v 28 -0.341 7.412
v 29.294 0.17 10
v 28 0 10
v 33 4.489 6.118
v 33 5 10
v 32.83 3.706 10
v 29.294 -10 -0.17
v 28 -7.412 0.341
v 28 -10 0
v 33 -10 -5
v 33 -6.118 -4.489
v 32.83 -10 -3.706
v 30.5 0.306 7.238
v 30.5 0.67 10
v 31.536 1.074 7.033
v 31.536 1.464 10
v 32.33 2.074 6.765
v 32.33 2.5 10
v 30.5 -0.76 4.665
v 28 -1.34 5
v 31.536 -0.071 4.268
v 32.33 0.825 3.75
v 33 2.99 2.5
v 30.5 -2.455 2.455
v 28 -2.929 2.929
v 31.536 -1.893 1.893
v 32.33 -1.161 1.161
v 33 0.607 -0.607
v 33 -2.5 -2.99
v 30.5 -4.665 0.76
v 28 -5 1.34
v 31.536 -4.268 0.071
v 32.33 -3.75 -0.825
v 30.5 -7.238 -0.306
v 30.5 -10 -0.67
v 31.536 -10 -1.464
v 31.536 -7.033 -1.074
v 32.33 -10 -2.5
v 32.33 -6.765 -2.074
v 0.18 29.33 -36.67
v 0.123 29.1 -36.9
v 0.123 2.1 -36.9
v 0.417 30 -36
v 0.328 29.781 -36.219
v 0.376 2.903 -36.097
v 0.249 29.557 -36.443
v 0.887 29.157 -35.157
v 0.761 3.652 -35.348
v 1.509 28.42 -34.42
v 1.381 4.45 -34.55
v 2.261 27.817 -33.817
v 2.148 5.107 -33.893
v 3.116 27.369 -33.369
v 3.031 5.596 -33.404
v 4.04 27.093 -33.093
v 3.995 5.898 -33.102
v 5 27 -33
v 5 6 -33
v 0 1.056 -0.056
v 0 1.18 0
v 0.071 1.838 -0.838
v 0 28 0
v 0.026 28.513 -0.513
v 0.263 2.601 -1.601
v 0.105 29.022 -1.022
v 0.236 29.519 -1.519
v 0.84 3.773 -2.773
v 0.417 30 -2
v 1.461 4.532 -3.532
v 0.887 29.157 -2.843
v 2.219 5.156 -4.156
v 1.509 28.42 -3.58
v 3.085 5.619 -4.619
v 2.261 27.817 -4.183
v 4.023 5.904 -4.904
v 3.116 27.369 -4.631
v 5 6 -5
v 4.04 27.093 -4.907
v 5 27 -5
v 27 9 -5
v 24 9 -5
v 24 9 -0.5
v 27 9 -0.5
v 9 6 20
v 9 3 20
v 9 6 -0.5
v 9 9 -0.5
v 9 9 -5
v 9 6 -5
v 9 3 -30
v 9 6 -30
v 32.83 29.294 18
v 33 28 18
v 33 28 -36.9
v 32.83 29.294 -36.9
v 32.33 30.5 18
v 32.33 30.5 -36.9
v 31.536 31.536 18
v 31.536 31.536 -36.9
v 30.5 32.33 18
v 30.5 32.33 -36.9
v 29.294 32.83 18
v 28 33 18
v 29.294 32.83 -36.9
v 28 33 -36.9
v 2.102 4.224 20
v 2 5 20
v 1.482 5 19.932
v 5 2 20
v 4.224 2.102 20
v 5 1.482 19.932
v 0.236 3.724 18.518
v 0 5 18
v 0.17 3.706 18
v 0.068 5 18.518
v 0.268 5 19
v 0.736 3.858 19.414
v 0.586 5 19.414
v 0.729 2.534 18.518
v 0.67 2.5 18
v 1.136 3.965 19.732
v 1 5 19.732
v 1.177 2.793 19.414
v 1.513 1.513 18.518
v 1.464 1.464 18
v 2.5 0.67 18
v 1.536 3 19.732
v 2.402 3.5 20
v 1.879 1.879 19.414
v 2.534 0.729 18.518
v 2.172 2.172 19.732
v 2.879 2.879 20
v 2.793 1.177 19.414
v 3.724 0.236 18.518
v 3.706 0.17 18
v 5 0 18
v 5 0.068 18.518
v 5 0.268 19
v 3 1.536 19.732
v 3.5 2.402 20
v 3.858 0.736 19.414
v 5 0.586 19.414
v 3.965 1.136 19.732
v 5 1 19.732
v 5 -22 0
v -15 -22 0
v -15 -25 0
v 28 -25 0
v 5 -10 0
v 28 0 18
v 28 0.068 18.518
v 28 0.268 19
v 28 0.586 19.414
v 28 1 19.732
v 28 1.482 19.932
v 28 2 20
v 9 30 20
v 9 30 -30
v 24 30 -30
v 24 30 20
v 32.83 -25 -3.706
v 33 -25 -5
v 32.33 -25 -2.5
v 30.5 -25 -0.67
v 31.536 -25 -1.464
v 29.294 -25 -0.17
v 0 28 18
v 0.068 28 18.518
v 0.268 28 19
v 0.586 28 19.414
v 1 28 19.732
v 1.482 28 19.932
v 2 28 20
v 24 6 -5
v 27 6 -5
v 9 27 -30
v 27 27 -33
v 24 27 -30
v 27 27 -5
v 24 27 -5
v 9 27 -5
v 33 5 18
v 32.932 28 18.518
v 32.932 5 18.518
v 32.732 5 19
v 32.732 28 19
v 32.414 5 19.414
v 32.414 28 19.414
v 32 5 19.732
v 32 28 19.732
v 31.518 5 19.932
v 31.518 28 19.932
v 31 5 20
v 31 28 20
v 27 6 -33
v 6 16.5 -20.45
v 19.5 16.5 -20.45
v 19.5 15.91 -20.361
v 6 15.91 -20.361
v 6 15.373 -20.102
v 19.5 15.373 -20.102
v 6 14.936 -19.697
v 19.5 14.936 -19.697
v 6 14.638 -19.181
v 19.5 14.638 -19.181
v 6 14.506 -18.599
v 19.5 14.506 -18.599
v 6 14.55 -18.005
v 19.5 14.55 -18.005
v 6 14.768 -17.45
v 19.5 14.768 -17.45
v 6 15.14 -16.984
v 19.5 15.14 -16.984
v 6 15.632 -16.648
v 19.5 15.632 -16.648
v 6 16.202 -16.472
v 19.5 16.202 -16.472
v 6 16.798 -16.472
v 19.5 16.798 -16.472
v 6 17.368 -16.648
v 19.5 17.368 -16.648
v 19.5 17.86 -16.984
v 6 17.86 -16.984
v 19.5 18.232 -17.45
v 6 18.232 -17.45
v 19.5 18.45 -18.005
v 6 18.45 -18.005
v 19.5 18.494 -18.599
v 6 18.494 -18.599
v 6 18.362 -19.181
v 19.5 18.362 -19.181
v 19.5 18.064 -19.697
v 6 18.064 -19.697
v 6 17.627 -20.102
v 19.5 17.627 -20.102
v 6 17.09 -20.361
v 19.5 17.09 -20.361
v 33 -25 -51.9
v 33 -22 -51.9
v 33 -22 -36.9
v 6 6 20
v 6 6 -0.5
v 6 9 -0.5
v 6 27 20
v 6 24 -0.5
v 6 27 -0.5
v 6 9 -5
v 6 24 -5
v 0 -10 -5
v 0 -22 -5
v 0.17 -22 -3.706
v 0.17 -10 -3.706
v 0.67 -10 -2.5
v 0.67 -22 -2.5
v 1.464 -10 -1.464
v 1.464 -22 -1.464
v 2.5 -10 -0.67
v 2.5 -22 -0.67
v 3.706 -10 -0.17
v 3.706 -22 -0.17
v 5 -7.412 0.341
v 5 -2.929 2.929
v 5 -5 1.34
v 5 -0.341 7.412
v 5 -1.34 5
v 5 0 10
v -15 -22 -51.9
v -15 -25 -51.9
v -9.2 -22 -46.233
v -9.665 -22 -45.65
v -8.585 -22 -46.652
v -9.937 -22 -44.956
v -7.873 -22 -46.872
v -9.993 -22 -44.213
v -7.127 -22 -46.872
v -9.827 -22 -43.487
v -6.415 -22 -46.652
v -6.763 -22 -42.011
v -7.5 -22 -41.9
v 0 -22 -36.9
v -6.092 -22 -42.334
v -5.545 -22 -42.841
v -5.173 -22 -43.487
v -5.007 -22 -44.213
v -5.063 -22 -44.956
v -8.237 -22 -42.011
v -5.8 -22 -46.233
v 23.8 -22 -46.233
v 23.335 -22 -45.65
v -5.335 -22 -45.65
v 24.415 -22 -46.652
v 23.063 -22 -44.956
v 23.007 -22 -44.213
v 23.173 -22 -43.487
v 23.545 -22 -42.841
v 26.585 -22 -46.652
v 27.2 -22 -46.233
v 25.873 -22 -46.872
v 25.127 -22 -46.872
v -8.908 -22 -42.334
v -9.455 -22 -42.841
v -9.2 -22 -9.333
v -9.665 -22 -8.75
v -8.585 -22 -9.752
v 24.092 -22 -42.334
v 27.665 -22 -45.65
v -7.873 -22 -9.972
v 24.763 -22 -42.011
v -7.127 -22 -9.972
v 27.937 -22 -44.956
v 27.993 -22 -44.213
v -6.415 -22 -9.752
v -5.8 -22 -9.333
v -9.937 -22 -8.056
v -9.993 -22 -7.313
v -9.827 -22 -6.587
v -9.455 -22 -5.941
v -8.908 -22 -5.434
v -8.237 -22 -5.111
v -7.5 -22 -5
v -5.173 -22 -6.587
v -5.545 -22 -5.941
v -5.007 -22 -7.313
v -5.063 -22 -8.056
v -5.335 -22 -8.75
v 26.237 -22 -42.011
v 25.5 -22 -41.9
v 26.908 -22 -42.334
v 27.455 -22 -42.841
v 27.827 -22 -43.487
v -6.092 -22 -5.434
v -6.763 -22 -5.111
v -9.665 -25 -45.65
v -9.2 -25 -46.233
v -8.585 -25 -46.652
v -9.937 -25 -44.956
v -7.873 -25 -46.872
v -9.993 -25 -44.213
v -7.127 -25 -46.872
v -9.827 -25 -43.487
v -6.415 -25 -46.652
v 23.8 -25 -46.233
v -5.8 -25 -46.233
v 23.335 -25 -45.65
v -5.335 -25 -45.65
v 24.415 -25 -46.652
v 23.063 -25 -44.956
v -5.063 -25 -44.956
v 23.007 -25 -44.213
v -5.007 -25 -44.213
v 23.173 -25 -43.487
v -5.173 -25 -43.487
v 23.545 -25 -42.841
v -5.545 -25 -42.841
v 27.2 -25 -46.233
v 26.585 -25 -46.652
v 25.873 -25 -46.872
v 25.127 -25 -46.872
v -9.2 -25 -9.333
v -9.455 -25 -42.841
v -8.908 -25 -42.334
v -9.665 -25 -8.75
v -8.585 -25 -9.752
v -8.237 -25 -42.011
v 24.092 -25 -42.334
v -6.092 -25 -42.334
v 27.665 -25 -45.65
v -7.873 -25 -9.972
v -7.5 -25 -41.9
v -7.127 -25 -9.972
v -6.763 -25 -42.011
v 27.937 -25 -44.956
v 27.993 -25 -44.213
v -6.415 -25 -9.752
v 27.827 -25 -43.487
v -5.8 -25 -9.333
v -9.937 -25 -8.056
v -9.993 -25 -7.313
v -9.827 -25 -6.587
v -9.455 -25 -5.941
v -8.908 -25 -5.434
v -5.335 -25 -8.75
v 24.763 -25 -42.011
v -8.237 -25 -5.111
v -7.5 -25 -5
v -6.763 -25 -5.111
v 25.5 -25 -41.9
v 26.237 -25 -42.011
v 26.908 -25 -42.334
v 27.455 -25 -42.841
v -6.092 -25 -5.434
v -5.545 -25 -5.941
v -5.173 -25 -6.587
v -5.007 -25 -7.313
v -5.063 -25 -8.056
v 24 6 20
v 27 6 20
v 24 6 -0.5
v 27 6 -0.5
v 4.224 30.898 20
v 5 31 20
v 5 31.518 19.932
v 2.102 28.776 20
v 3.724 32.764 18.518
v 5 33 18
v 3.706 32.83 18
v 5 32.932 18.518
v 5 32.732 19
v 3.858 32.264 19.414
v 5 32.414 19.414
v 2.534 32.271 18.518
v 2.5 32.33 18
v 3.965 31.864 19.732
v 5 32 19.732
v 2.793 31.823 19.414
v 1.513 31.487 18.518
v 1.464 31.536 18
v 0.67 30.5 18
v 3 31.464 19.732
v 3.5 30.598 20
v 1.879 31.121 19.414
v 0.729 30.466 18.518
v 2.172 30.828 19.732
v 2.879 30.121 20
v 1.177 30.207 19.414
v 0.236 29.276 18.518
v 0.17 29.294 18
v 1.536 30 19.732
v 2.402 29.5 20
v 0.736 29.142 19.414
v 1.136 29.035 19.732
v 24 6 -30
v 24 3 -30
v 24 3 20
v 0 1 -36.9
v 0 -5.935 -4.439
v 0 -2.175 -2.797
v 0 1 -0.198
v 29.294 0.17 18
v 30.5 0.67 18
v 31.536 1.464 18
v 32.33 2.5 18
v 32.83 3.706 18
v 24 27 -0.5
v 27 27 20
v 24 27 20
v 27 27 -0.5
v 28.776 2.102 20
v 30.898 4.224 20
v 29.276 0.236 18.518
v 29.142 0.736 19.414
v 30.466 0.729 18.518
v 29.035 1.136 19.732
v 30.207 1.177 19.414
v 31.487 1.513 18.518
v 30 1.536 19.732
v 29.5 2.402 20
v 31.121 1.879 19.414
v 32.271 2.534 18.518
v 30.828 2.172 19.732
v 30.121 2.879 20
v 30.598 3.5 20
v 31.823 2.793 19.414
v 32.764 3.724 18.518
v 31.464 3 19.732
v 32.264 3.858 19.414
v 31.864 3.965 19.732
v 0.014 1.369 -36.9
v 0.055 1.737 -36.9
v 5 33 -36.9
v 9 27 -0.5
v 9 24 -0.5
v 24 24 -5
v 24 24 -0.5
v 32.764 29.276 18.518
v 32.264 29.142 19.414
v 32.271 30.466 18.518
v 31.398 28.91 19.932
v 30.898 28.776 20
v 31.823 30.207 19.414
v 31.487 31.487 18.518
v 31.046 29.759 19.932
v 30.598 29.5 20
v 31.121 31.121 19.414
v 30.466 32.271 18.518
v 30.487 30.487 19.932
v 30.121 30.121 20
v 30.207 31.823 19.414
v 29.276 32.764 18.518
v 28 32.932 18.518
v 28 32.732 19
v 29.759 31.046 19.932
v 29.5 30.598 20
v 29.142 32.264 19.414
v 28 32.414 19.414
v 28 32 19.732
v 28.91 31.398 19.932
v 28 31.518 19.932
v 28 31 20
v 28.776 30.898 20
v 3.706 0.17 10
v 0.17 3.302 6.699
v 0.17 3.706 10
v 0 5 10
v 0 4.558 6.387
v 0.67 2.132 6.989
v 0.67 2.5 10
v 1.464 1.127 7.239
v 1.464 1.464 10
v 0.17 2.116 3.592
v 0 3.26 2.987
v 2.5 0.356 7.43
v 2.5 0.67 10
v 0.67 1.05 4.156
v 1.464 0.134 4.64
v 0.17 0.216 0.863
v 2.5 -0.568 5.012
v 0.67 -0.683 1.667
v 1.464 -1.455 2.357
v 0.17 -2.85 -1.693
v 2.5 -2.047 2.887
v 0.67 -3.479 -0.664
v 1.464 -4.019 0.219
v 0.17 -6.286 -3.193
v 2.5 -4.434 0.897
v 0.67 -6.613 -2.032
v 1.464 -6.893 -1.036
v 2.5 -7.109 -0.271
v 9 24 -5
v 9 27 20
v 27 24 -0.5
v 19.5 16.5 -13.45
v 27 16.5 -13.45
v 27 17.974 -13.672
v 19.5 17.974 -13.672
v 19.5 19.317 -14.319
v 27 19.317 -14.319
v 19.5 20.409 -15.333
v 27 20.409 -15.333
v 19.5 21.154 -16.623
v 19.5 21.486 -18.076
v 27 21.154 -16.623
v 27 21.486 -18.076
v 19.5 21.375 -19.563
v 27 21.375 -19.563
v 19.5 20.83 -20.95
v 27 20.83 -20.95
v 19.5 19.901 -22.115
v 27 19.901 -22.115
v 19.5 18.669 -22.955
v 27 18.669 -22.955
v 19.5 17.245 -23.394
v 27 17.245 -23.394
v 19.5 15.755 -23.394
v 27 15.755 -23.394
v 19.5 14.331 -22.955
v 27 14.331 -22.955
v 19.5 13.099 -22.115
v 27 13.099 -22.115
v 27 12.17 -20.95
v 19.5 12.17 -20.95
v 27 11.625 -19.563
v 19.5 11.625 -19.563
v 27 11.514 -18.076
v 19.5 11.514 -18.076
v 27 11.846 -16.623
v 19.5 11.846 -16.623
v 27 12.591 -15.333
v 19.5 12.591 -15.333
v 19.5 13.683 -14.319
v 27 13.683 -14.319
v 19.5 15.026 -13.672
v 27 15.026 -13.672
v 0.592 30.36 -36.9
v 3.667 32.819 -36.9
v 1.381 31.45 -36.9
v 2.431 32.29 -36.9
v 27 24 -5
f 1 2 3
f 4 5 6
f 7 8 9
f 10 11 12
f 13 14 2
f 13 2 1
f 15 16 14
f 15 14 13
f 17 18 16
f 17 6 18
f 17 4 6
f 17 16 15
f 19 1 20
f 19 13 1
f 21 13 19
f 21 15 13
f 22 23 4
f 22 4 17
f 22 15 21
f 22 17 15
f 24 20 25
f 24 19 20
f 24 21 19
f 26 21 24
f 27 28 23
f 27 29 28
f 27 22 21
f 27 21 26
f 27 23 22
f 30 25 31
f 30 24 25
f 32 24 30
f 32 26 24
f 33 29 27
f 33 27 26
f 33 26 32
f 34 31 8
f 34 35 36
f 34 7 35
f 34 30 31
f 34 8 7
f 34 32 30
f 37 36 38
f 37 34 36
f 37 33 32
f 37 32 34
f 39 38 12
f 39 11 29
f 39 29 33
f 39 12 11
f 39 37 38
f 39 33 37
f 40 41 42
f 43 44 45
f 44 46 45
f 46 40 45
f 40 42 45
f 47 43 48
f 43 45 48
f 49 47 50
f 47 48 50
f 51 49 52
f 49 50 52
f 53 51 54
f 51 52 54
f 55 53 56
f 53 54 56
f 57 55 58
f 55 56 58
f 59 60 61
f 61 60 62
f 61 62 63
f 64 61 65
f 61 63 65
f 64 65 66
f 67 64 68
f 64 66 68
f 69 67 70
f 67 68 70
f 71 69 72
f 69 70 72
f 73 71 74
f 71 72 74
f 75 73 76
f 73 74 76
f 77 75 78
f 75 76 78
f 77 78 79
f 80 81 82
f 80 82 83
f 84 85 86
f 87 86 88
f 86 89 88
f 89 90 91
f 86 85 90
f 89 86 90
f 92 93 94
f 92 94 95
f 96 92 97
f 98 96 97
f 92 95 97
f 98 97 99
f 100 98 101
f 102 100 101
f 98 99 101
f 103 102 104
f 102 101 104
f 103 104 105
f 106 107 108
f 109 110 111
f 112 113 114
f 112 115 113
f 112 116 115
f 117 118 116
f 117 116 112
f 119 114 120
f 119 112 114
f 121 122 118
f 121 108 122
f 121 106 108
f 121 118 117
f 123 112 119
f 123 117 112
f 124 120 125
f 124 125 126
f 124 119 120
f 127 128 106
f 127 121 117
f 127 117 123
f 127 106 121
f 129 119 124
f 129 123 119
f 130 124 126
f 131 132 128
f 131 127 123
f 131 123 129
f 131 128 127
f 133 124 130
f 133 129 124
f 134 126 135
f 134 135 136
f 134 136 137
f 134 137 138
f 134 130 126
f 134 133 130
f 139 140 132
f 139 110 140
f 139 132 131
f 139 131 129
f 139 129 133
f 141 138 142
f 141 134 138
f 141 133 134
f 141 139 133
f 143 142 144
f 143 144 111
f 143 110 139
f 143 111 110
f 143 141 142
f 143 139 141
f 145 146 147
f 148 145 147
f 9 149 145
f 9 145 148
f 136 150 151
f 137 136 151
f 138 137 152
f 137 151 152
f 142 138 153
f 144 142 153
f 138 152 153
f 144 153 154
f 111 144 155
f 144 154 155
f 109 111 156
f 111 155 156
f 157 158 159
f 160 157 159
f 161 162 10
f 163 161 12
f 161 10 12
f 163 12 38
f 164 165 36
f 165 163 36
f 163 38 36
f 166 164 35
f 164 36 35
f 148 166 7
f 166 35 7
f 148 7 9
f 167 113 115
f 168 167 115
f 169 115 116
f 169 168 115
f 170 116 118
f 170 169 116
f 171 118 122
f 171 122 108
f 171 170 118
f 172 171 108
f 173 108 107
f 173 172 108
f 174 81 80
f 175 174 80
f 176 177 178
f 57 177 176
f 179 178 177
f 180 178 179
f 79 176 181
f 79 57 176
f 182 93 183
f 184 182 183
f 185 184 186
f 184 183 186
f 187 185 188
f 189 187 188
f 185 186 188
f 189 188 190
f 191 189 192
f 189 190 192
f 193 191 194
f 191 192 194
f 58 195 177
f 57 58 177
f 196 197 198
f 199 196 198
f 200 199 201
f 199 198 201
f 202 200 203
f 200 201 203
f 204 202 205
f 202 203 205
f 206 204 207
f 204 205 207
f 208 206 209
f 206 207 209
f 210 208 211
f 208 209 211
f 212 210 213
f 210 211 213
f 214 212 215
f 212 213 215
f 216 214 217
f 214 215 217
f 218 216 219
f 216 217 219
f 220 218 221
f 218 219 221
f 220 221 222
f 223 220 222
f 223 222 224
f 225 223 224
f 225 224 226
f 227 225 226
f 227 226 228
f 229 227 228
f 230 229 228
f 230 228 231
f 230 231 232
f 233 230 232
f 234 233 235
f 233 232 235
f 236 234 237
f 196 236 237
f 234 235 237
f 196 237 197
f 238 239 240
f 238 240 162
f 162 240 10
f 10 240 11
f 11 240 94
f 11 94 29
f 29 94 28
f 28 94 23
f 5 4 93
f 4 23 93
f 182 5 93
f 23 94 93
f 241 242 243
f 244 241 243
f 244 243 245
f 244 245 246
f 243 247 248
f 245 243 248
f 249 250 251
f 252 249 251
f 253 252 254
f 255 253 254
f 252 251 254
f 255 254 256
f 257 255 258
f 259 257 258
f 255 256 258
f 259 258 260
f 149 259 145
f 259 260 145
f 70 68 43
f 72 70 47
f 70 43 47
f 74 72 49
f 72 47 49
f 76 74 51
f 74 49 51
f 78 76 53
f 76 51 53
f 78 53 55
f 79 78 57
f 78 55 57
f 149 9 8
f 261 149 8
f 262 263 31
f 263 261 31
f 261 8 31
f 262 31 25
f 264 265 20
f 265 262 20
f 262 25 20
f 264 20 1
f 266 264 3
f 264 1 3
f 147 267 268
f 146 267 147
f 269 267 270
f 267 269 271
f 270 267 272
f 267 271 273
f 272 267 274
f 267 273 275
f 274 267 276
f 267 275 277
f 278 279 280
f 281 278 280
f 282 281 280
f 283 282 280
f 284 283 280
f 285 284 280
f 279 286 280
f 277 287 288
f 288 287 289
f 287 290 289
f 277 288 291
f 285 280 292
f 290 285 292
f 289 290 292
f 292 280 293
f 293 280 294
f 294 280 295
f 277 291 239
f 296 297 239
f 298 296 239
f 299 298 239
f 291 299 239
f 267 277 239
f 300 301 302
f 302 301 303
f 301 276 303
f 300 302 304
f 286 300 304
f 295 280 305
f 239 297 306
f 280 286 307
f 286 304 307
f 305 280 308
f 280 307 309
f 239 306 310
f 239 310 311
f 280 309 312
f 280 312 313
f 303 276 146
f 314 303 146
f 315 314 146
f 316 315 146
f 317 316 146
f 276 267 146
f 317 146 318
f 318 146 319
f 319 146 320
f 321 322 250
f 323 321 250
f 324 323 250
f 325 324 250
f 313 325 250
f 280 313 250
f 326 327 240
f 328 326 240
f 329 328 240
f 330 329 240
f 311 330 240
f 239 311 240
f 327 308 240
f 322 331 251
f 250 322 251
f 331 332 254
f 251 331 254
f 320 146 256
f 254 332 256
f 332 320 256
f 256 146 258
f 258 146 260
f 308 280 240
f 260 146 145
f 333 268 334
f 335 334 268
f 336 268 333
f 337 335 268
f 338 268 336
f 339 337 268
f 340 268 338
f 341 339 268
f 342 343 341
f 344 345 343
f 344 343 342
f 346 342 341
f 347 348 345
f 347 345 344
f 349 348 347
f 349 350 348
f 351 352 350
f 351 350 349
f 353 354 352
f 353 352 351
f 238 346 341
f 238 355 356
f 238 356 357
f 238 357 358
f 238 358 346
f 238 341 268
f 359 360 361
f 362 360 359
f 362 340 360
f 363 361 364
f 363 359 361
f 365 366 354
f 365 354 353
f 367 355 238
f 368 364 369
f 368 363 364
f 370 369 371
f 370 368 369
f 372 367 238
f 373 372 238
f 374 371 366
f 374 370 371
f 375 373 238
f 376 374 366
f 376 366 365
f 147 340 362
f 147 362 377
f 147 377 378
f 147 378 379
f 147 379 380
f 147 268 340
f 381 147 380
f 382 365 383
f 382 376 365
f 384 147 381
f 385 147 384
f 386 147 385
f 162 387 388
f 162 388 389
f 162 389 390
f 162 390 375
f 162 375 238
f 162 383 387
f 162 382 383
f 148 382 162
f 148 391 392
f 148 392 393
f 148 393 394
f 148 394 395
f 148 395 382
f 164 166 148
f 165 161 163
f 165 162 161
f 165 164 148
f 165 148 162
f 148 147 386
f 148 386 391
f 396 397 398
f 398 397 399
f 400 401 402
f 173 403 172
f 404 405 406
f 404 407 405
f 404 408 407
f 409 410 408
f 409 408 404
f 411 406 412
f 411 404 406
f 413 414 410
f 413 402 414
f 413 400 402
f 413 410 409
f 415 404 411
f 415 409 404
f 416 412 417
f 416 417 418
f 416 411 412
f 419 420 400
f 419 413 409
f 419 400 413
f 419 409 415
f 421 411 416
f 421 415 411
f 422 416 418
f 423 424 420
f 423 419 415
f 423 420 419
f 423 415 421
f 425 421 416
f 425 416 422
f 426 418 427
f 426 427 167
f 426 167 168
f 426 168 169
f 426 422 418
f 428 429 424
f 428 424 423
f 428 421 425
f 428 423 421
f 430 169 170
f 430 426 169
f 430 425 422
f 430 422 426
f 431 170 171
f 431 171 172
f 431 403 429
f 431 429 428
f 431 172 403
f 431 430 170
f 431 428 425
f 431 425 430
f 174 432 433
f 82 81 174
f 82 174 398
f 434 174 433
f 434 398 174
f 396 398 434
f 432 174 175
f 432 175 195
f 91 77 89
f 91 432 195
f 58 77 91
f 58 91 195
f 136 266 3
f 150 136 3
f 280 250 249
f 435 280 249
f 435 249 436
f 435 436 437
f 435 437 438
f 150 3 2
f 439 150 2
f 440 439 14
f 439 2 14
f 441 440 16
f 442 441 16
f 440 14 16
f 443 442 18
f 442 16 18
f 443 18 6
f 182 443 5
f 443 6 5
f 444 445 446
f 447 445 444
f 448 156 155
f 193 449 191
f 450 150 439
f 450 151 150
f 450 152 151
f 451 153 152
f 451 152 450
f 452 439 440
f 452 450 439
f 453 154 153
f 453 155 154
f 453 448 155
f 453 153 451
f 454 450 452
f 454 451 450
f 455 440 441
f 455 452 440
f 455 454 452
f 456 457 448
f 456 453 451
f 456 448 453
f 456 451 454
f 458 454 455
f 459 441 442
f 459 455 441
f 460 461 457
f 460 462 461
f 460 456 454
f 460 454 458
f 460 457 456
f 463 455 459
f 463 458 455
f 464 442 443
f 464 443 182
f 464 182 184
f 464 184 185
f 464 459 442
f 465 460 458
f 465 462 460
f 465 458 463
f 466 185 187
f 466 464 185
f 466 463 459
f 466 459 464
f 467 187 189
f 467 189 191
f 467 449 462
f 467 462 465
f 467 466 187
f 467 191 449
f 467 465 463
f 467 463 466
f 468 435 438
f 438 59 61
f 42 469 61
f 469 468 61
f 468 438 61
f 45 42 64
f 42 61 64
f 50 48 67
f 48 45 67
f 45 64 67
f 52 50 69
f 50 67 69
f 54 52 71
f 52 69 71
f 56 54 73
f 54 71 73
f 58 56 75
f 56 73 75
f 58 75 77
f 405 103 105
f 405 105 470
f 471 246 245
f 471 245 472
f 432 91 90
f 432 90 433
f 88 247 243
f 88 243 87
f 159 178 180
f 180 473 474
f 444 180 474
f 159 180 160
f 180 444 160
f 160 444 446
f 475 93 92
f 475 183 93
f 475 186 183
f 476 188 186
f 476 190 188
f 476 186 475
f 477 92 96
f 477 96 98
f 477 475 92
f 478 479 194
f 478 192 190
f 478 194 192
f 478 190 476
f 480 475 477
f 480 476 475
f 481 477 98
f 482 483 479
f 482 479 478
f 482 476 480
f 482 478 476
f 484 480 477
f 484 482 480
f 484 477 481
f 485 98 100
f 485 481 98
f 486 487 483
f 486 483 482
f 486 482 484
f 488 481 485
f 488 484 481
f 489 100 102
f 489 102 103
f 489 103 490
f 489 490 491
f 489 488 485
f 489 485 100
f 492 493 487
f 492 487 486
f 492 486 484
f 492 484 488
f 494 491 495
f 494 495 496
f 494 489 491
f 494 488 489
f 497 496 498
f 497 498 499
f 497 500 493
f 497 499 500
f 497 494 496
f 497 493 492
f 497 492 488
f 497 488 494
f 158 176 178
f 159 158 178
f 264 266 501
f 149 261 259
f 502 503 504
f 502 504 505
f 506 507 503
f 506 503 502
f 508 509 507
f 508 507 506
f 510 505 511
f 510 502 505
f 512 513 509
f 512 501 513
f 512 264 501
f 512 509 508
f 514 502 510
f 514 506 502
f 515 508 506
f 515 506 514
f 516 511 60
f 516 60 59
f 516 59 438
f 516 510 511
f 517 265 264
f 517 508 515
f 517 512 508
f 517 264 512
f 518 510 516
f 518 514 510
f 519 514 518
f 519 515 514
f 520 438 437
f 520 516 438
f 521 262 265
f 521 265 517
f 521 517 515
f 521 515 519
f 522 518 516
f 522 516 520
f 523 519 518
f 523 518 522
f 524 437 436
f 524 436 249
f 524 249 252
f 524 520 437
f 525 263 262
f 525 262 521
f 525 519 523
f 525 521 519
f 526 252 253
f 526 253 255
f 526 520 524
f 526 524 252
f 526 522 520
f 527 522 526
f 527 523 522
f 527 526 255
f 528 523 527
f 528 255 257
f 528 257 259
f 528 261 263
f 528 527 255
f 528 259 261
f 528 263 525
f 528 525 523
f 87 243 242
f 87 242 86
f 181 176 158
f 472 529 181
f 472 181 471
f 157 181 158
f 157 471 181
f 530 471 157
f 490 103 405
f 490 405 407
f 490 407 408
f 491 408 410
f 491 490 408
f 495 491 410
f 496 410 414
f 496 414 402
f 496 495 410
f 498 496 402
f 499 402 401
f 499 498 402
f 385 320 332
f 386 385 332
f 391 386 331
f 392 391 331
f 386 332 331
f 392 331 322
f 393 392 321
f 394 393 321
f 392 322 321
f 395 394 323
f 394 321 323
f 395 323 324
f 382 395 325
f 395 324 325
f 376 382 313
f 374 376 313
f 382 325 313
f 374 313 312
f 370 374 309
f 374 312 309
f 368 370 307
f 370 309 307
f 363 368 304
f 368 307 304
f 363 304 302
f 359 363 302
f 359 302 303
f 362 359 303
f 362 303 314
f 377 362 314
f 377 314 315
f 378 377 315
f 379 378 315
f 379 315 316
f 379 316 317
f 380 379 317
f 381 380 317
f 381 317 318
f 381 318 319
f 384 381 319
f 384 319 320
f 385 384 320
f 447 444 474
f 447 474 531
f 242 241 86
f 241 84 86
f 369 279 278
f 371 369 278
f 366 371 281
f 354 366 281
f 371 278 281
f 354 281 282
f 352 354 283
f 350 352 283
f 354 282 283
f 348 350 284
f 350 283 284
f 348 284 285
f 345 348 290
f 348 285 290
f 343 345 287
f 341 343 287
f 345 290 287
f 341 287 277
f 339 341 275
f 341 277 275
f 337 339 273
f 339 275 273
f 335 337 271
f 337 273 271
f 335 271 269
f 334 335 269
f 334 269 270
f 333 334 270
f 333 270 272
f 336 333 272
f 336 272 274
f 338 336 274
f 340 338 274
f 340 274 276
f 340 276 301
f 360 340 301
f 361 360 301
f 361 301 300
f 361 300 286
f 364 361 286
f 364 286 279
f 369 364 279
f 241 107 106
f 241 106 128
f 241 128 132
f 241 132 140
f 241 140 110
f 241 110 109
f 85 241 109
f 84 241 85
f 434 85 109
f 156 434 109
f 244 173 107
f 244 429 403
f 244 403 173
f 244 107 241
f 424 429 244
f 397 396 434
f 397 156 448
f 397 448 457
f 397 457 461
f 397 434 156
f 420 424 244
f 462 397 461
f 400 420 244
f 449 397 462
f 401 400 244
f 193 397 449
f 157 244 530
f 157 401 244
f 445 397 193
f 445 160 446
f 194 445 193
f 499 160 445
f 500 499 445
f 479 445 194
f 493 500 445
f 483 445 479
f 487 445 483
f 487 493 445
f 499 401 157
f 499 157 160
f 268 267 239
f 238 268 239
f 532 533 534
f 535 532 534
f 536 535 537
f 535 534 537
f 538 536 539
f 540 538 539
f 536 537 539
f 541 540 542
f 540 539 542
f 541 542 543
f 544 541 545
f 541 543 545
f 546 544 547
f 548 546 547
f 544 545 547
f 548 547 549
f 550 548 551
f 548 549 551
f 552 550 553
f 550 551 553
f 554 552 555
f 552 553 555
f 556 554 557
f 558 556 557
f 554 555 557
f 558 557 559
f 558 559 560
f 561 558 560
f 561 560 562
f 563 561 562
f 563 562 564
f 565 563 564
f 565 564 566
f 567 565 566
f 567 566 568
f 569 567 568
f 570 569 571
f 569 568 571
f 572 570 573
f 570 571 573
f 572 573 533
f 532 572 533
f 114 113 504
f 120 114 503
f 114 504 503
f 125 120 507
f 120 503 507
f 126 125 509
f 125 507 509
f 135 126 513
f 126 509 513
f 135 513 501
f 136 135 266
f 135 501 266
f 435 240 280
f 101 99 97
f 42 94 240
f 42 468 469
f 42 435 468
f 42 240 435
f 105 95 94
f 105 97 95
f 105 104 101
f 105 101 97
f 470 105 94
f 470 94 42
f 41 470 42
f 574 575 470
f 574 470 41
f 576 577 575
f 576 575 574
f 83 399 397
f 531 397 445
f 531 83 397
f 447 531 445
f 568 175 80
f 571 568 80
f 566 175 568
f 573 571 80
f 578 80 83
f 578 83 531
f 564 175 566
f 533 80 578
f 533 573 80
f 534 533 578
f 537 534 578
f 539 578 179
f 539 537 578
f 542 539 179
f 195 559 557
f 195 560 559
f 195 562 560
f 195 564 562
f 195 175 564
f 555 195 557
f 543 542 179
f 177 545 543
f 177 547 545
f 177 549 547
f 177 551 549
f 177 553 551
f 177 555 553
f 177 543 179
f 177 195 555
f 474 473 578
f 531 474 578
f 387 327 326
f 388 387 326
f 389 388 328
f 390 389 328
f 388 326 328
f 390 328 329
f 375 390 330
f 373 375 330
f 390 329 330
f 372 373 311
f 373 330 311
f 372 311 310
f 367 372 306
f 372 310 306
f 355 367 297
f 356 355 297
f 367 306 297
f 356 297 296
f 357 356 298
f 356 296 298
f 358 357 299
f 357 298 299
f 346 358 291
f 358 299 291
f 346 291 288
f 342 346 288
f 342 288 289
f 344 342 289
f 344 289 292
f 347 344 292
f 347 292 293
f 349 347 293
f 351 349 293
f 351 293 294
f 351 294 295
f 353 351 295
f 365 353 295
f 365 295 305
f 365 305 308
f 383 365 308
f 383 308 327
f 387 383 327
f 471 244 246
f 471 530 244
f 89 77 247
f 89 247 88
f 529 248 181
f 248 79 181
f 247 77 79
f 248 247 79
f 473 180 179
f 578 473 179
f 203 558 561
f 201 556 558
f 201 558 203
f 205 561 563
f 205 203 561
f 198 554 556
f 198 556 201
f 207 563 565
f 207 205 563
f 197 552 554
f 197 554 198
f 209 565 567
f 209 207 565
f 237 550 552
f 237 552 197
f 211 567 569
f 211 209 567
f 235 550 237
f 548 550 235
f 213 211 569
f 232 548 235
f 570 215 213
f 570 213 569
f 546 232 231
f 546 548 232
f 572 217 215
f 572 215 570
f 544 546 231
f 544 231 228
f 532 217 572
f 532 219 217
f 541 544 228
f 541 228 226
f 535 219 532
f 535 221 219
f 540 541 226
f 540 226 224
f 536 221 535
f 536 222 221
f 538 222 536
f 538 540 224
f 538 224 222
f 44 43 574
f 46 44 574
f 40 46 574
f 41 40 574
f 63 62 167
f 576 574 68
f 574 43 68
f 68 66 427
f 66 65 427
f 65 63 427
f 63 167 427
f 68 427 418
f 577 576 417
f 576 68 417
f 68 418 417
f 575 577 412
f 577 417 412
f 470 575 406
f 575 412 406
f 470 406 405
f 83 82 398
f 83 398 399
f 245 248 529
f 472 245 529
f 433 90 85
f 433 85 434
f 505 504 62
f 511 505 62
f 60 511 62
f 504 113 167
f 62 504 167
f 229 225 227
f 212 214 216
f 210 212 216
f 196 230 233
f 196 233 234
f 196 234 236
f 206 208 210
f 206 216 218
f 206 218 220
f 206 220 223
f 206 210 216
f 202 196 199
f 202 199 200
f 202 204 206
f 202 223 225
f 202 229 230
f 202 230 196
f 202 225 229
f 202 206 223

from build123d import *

# Parameters (mm, degrees)
SKETCH1_W           = 33
SKETCH1_H           = 33
BOSS_EXTRUDE1_DEPTH = 20
SHELL1_T            = -6
SKETCH2_W           = 33
SKETCH2_H           = 55
BOSS_EXTRUDE2_DEPTH = 36.9
SKETCH5_W           = 48
SKETCH5_H           = 51.9
BOSS_EXTRUDE3_DEPTH = 3
SKETCH6_R           = 2.5
CUT_EXTRUDE1_DEPTH  = 83.508242013
SKETCH7_W           = 15
SKETCH7_H           = 50
CUT_EXTRUDE2_DEPTH  = 3
SKETCH9_W           = 21
SKETCH9_H           = 21
CUT_EXTRUDE3_DEPTH  = 39
SKETCH10_R          = 5
BOSS_EXTRUDE4_DEPTH = 7.5
SKETCH12_W          = 28
SKETCH12_H          = 21
CUT_EXTRUDE4_DEPTH  = 19
SKETCH13_R          = 2
BOSS_EXTRUDE5_DEPTH = 13.5
FILLET1_R           = 10
BOSS_EXTRUDE6_START = -25
SKETCH14_W          = 3
SKETCH14_H          = 3
BOSS_EXTRUDE6_DEPTH = 4.5
FILLET2_R           = 2
FILLET3_R           = 5
FILLET4_R           = 5


with BuildPart() as part:
    # Sketch1 → Boss-Extrude1 (new body)
    with BuildSketch(Plane.XY):
        with Locations((16.5, 16.5)):
            Rectangle(SKETCH1_W, SKETCH1_H)
    extrude(amount=BOSS_EXTRUDE1_DEPTH)

    # Shell1
    shell1_openings = [part.faces().sort_by_distance(p)[0] for p in [
        (16.5, 16.5, 20),
    ]]
    offset(amount=SHELL1_T, openings=shell1_openings, kind=Kind.INTERSECTION)

    # Sketch2 → Boss-Extrude2 (add)
    with BuildSketch(Plane(origin=(0, 0, 0), x_dir=(-1, 0, 0), z_dir=(0, 0, -1))):
        with Locations((-16.5, 5.5)):
            Rectangle(SKETCH2_W, SKETCH2_H)
    extrude(amount=BOSS_EXTRUDE2_DEPTH)

    # Sketch5 → Boss-Extrude3 (add)
    with BuildSketch(Plane.XZ.offset(22)):
        with Locations((9, -25.95)):
            Rectangle(SKETCH5_W, SKETCH5_H)
    extrude(amount=BOSS_EXTRUDE3_DEPTH)

    # Sketch6 → Cut-Extrude1 (cut, through all)
    with BuildSketch(Plane(origin=(0, -22, 0), x_dir=(1, 0, 0), z_dir=(0, 1, 0))):
        with Locations(Location((-7.5, 7.5, 0), (0, 0, 270))):
            Circle(SKETCH6_R)
        with Locations(Location((-7.5, 44.4, 0), (0, 0, 270))):
            Circle(SKETCH6_R)
        with Locations(Location((25.5, 44.4, 0), (0, 0, 270))):
            Circle(SKETCH6_R)
    extrude(amount=-CUT_EXTRUDE1_DEPTH, mode=Mode.SUBTRACT)

    # Sketch7 → Cut-Extrude2 (cut)
    with BuildSketch(Plane.XZ.offset(-27)):
        with Locations((16.5, -5)):
            Rectangle(SKETCH7_W, SKETCH7_H)
    cut_extrude2 = extrude(amount=-CUT_EXTRUDE2_DEPTH, mode=Mode.SUBTRACT)

    # Mirror2: Cut-Extrude2 across plane
    add(cut_extrude2.mirror(Plane(origin=(0, 16.5, 0), x_dir=(0, 0, 1), z_dir=(0, -1, 0))), mode=Mode.SUBTRACT)

    # Sketch9 → Cut-Extrude3 (cut)
    with BuildSketch(Plane.XY.offset(6)):
        with Locations((16.5, 16.5)):
            Rectangle(SKETCH9_W, SKETCH9_H)
    extrude(amount=-CUT_EXTRUDE3_DEPTH, mode=Mode.SUBTRACT)

    # Sketch10 → Boss-Extrude4 (add)
    with BuildSketch(Plane.ZY.offset(-27)):
        with Locations((-18.45, 16.5)):
            Circle(SKETCH10_R)
    extrude(amount=BOSS_EXTRUDE4_DEPTH)

    # Sketch12 → Cut-Extrude4 (cut)
    with BuildSketch(Plane(origin=(6, 0, 0), x_dir=(0, 0, -1), z_dir=(1, 0, 0))):
        with Locations((19, 16.5)):
            Rectangle(SKETCH12_W, SKETCH12_H)
    extrude(amount=-CUT_EXTRUDE4_DEPTH, mode=Mode.SUBTRACT)

    # Sketch13 → Boss-Extrude5 (add)
    with BuildSketch(Plane.ZY.offset(-19.5)):
        with Locations(Location((-18.45, 16.5, 0), (0, 0, 180))):
            Circle(SKETCH13_R)
    extrude(amount=BOSS_EXTRUDE5_DEPTH)

    # Fillet1
    fillet1_edges = [part.edges().sort_by_distance(p)[0] for p in [
        (16.5, 0, 0),
    ]]
    fillet(fillet1_edges, radius=FILLET1_R)

    # Sketch14 → Boss-Extrude6 (add)
    with BuildSketch(Plane.XY.offset(20).offset(BOSS_EXTRUDE6_START)):
        with Locations((7.5, 7.5)):
            Rectangle(SKETCH14_W, SKETCH14_H)
        with Locations((7.5, 25.5)):
            Rectangle(SKETCH14_W, SKETCH14_H)
        with Locations((25.5, 25.5)):
            Rectangle(SKETCH14_W, SKETCH14_H)
        with Locations((25.5, 7.5)):
            Rectangle(SKETCH14_W, SKETCH14_H)
    extrude(amount=BOSS_EXTRUDE6_DEPTH)

    # Fillet2
    fillet2_edges = [part.edges().sort_by_distance(p)[0] for p in [
        (33, 16.5, 20),
        (16.5, 33, 20),
        (0, 16.5, 20),
        (16.5, 0, 20),
    ]]
    fillet(fillet2_edges, radius=FILLET2_R)

    # Fillet3
    # the kernel refuses this fillet: 5 mm, written as the material it takes off along each edge
    with BuildSketch(Plane(origin=(5, 28, 20), x_dir=(0, 1, 0), z_dir=(1, 0, 0))) as fillet3_piece_1:
        with BuildLine():
            CenterArc((3, -2), 2, 0, 90)
            Line((5, -2), (5, 0))
            Line((5, 0), (3, 0))
        make_face()
    revolve(axis=Axis((5, 28, 20), (0, 0, 1)), revolution_arc=90, mode=Mode.SUBTRACT)
    with BuildSketch(Plane(origin=(28, 28, 20), x_dir=(1, 0, 0), z_dir=(0, -1, 0))) as fillet3_piece_2:
        with BuildLine():
            CenterArc((3, -2), 2, 0, 90)
            Line((5, -2), (5, 0))
            Line((5, 0), (3, 0))
        make_face()
    revolve(axis=Axis((28, 28, 20), (0, 0, 1)), revolution_arc=90, mode=Mode.SUBTRACT)
    with BuildSketch(Plane(origin=(0, 6, -33), x_dir=(0, 0, -1), z_dir=(0, 1, 0)), Plane(origin=(0, 27, -5), x_dir=(0, 0, 1), z_dir=(0, -1, 0))) as fillet3_piece_3:
        with BuildLine():
            CenterArc((FILLET3_R, -FILLET3_R), FILLET3_R, 90, 90)
            Line((0, -FILLET3_R), (-FILLET3_R * 0.02, -FILLET3_R))
            Line((-FILLET3_R * 0.02, -FILLET3_R), (-FILLET3_R * 0.02, FILLET3_R * 0.02))
            Line((-FILLET3_R * 0.02, FILLET3_R * 0.02), (FILLET3_R, FILLET3_R * 0.02))
            Line((FILLET3_R, FILLET3_R * 0.02), (FILLET3_R, 0))
        make_face()
    extrude(amount=21, mode=Mode.SUBTRACT)
    with BuildSketch(Plane(origin=(0, 6, -5), x_dir=(0, -1, 0), z_dir=(0, 0, -1)), Plane(origin=(0, 27, -33), x_dir=(0, 1, 0), z_dir=(0, 0, 1))) as fillet3_piece_4:
        with BuildLine():
            CenterArc((FILLET3_R, -FILLET3_R), FILLET3_R, 90, 90)
            Line((0, -FILLET3_R), (-FILLET3_R * 0.02, -FILLET3_R))
            Line((-FILLET3_R * 0.02, -FILLET3_R), (-FILLET3_R * 0.02, FILLET3_R * 0.02))
            Line((-FILLET3_R * 0.02, FILLET3_R * 0.02), (FILLET3_R, FILLET3_R * 0.02))
            Line((FILLET3_R, FILLET3_R * 0.02), (FILLET3_R, 0))
        make_face()
    extrude(amount=28, mode=Mode.SUBTRACT)
    with BuildSketch(Plane(origin=(33, 33, -36.9), x_dir=(0, -1, 0), z_dir=(0, 0, 1)), Plane(origin=(0, 33, 20), x_dir=(0, -1, 0), z_dir=(0, 0, -1))) as fillet3_piece_5:
        with BuildLine():
            CenterArc((FILLET3_R, -FILLET3_R), FILLET3_R, 90, 90)
            Line((0, -FILLET3_R), (-FILLET3_R * 0.02, -FILLET3_R))
            Line((-FILLET3_R * 0.02, -FILLET3_R), (-FILLET3_R * 0.02, FILLET3_R * 0.02))
            Line((-FILLET3_R * 0.02, FILLET3_R * 0.02), (FILLET3_R, FILLET3_R * 0.02))
            Line((FILLET3_R, FILLET3_R * 0.02), (FILLET3_R, 0))
        make_face()
    extrude(amount=56.9, mode=Mode.SUBTRACT)
    with BuildSketch(Plane(origin=(0, 6, -5), x_dir=(0, -1, 0), z_dir=(0, 0, -1))) as fillet3_piece_6a_section:
        with BuildLine():
            CenterArc((FILLET3_R, -FILLET3_R), FILLET3_R, 90, 90)
            Line((0, -FILLET3_R), (-FILLET3_R * 0.02, -FILLET3_R))
            Line((-FILLET3_R * 0.02, -FILLET3_R), (-FILLET3_R * 0.02, FILLET3_R * 0.02))
            Line((-FILLET3_R * 0.02, FILLET3_R * 0.02), (FILLET3_R, FILLET3_R * 0.02))
            Line((FILLET3_R, FILLET3_R * 0.02), (FILLET3_R, 0))
        make_face()
    fillet3_piece_6a = extrude(amount=40.5, mode=Mode.PRIVATE)
    fillet3_piece_6a = split(fillet3_piece_6a, bisect_by=Plane(origin=(1.131975571, 4.868024429, -33), z_dir=(0, 0, -1)), keep=Keep.TOP, mode=Mode.PRIVATE)
    with BuildSketch(Plane(origin=(0, -6.5, -33), x_dir=(0, 0, -1), z_dir=(0, 1, 0))) as fillet3_piece_6b_section:
        with BuildLine():
            CenterArc((FILLET3_R, -FILLET3_R), FILLET3_R, 90, 90)
            Line((0, -FILLET3_R), (-FILLET3_R * 0.02, -FILLET3_R))
            Line((-FILLET3_R * 0.02, -FILLET3_R), (-FILLET3_R * 0.02, FILLET3_R * 0.02))
            Line((-FILLET3_R * 0.02, FILLET3_R * 0.02), (FILLET3_R, FILLET3_R * 0.02))
            Line((FILLET3_R, FILLET3_R * 0.02), (FILLET3_R, 0))
        make_face()
    fillet3_piece_6b = extrude(amount=33.5, mode=Mode.PRIVATE)
    fillet3_piece_6b = split(fillet3_piece_6b, bisect_by=Plane(origin=(1.131975571, 6, -34.131975571), z_dir=(0, -1, 0)), keep=Keep.TOP, mode=Mode.PRIVATE)
    fillet3_piece_6 = fillet3_piece_6a & fillet3_piece_6b
    add(fillet3_piece_6, mode=Mode.SUBTRACT)
    with BuildSketch(Plane(origin=(0, 27, -45.5), x_dir=(0, 1, 0), z_dir=(0, 0, 1))) as fillet3_piece_7a_section:
        with BuildLine():
            CenterArc((FILLET3_R, -FILLET3_R), FILLET3_R, 90, 90)
            Line((0, -FILLET3_R), (-FILLET3_R * 0.02, -FILLET3_R))
            Line((-FILLET3_R * 0.02, -FILLET3_R), (-FILLET3_R * 0.02, FILLET3_R * 0.02))
            Line((-FILLET3_R * 0.02, FILLET3_R * 0.02), (FILLET3_R, FILLET3_R * 0.02))
            Line((FILLET3_R, FILLET3_R * 0.02), (FILLET3_R, 0))
        make_face()
    fillet3_piece_7a = extrude(amount=40.5, mode=Mode.PRIVATE)
    fillet3_piece_7a = split(fillet3_piece_7a, bisect_by=Plane(origin=(1.131975571, 28.131975571, -33), z_dir=(0, 0, -1)), keep=Keep.TOP, mode=Mode.PRIVATE)
    with BuildSketch(Plane(origin=(0, 6, -33), x_dir=(0, 0, -1), z_dir=(0, 1, 0))) as fillet3_piece_7b_section:
        with BuildLine():
            CenterArc((FILLET3_R, -FILLET3_R), FILLET3_R, 90, 90)
            Line((0, -FILLET3_R), (-FILLET3_R * 0.02, -FILLET3_R))
            Line((-FILLET3_R * 0.02, -FILLET3_R), (-FILLET3_R * 0.02, FILLET3_R * 0.02))
            Line((-FILLET3_R * 0.02, FILLET3_R * 0.02), (FILLET3_R, FILLET3_R * 0.02))
            Line((FILLET3_R, FILLET3_R * 0.02), (FILLET3_R, 0))
        make_face()
    fillet3_piece_7b = extrude(amount=33.5, mode=Mode.PRIVATE)
    fillet3_piece_7b = split(fillet3_piece_7b, bisect_by=Plane(origin=(1.131975571, 27, -34.131975571), z_dir=(0, 1, 0)), keep=Keep.TOP, mode=Mode.PRIVATE)
    fillet3_piece_7 = fillet3_piece_7a & fillet3_piece_7b
    add(fillet3_piece_7, mode=Mode.SUBTRACT)
    with BuildSketch(Plane(origin=(0, 27, -5), x_dir=(0, 0, 1), z_dir=(0, -1, 0))) as fillet3_piece_8a_section:
        with BuildLine():
            CenterArc((FILLET3_R, -FILLET3_R), FILLET3_R, 90, 90)
            Line((0, -FILLET3_R), (-FILLET3_R * 0.02, -FILLET3_R))
            Line((-FILLET3_R * 0.02, -FILLET3_R), (-FILLET3_R * 0.02, FILLET3_R * 0.02))
            Line((-FILLET3_R * 0.02, FILLET3_R * 0.02), (FILLET3_R, FILLET3_R * 0.02))
            Line((FILLET3_R, FILLET3_R * 0.02), (FILLET3_R, 0))
        make_face()
    fillet3_piece_8a = extrude(amount=33.5, mode=Mode.PRIVATE)
    fillet3_piece_8a = split(fillet3_piece_8a, bisect_by=Plane(origin=(1.131975571, 6, -3.868024429), z_dir=(0, -1, 0)), keep=Keep.TOP, mode=Mode.PRIVATE)
    with BuildSketch(Plane(origin=(0, 6, 7.5), x_dir=(0, -1, 0), z_dir=(0, 0, -1))) as fillet3_piece_8b_section:
        with BuildLine():
            CenterArc((FILLET3_R, -FILLET3_R), FILLET3_R, 90, 90)
            Line((0, -FILLET3_R), (-FILLET3_R * 0.02, -FILLET3_R))
            Line((-FILLET3_R * 0.02, -FILLET3_R), (-FILLET3_R * 0.02, FILLET3_R * 0.02))
            Line((-FILLET3_R * 0.02, FILLET3_R * 0.02), (FILLET3_R, FILLET3_R * 0.02))
            Line((FILLET3_R, FILLET3_R * 0.02), (FILLET3_R, 0))
        make_face()
    fillet3_piece_8b = extrude(amount=40.5, mode=Mode.PRIVATE)
    fillet3_piece_8b = split(fillet3_piece_8b, bisect_by=Plane(origin=(1.131975571, 4.868024429, -5), z_dir=(0, 0, 1)), keep=Keep.TOP, mode=Mode.PRIVATE)
    fillet3_piece_8 = fillet3_piece_8a & fillet3_piece_8b
    add(fillet3_piece_8, mode=Mode.SUBTRACT)
    with BuildSketch(Plane(origin=(0, 27, -33), x_dir=(0, 1, 0), z_dir=(0, 0, 1))) as fillet3_piece_9a_section:
        with BuildLine():
            CenterArc((FILLET3_R, -FILLET3_R), FILLET3_R, 90, 90)
            Line((0, -FILLET3_R), (-FILLET3_R * 0.02, -FILLET3_R))
            Line((-FILLET3_R * 0.02, -FILLET3_R), (-FILLET3_R * 0.02, FILLET3_R * 0.02))
            Line((-FILLET3_R * 0.02, FILLET3_R * 0.02), (FILLET3_R, FILLET3_R * 0.02))
            Line((FILLET3_R, FILLET3_R * 0.02), (FILLET3_R, 0))
        make_face()
    fillet3_piece_9a = extrude(amount=40.5, mode=Mode.PRIVATE)
    fillet3_piece_9a = split(fillet3_piece_9a, bisect_by=Plane(origin=(1.131975571, 28.131975571, -5), z_dir=(0, 0, 1)), keep=Keep.TOP, mode=Mode.PRIVATE)
    with BuildSketch(Plane(origin=(0, 39.5, -5), x_dir=(0, 0, 1), z_dir=(0, -1, 0))) as fillet3_piece_9b_section:
        with BuildLine():
            CenterArc((FILLET3_R, -FILLET3_R), FILLET3_R, 90, 90)
            Line((0, -FILLET3_R), (-FILLET3_R * 0.02, -FILLET3_R))
            Line((-FILLET3_R * 0.02, -FILLET3_R), (-FILLET3_R * 0.02, FILLET3_R * 0.02))
            Line((-FILLET3_R * 0.02, FILLET3_R * 0.02), (FILLET3_R, FILLET3_R * 0.02))
            Line((FILLET3_R, FILLET3_R * 0.02), (FILLET3_R, 0))
        make_face()
    fillet3_piece_9b = extrude(amount=33.5, mode=Mode.PRIVATE)
    fillet3_piece_9b = split(fillet3_piece_9b, bisect_by=Plane(origin=(1.131975571, 27, -3.868024429), z_dir=(0, 1, 0)), keep=Keep.TOP, mode=Mode.PRIVATE)
    fillet3_piece_9 = fillet3_piece_9a & fillet3_piece_9b
    add(fillet3_piece_9, mode=Mode.SUBTRACT)

    # Fillet4
    # the kernel refuses this fillet: 5 mm, written as the material it takes off along each edge
    with BuildSketch(Plane(origin=(5, 5, 20), x_dir=(-1, 0, 0), z_dir=(0, 1, 0))) as fillet4_piece_1:
        with BuildLine():
            CenterArc((3, -2), 2, 0, 90)
            Line((5, -2), (5, 0))
            Line((5, 0), (3, 0))
        make_face()
    revolve(axis=Axis((5, 5, 20), (0, 0, 1)), revolution_arc=90, mode=Mode.SUBTRACT)
    with BuildSketch(Plane(origin=(28, 5, 20), x_dir=(0, -1, 0), z_dir=(-1, 0, 0))) as fillet4_piece_2:
        with BuildLine():
            CenterArc((3, -2), 2, 0, 90)
            Line((5, -2), (5, 0))
            Line((5, 0), (3, 0))
        make_face()
    revolve(axis=Axis((28, 5, 20), (0, 0, 1)), revolution_arc=90, mode=Mode.SUBTRACT)
    with BuildSketch(Plane(origin=(33, 0, 10), x_dir=(-1, 0, 0), z_dir=(0, 0, 1))) as fillet4_piece_3:
        with BuildLine():
            CenterArc((FILLET4_R, -FILLET4_R), FILLET4_R, 90, 90)
            Line((0, -FILLET4_R), (0, 0))
            Line((0, 0), (FILLET4_R, 0))
        make_face()
    extrude(amount=10, mode=Mode.SUBTRACT)
    with BuildSketch(Plane(origin=(33, -10, 0), x_dir=(0, 0, -1), z_dir=(0, -1, 0))) as fillet4_piece_4:
        with BuildLine():
            CenterArc((FILLET4_R, -FILLET4_R), FILLET4_R, 90, 90)
            Line((0, -FILLET4_R), (0, 0))
            Line((0, 0), (FILLET4_R, 0))
        make_face()
    extrude(amount=27.5, mode=Mode.SUBTRACT)
    with BuildSketch(Plane(origin=(0, -22, 0), x_dir=(1, 0, 0), z_dir=(0, 1, 0))) as fillet4_piece_5:
        with BuildLine():
            CenterArc((FILLET4_R, FILLET4_R), FILLET4_R, 180, 90)
            Line((0, FILLET4_R), (0, 0))
            Line((0, 0), (FILLET4_R, 0))
        make_face()
    extrude(amount=12, mode=Mode.SUBTRACT)
    with BuildSketch(Plane(origin=(0, 0, 10), x_dir=(1, 0, 0), z_dir=(0, 0, 1))) as fillet4_piece_6:
        with BuildLine():
            CenterArc((FILLET4_R, FILLET4_R), FILLET4_R, 180, 90)
            Line((0, FILLET4_R), (0, 0))
            Line((0, 0), (FILLET4_R, 0))
        make_face()
    extrude(amount=10, mode=Mode.SUBTRACT)
    with BuildSketch(Plane(origin=(33, -10, 10), x_dir=(0, 1, 0), z_dir=(0, 0, 1))) as fillet4_piece_7:
        with BuildLine():
            CenterArc((10 + FILLET4_R, FILLET4_R), FILLET4_R, 180, 90)
            Line((10, FILLET4_R), (10, 0))
            Line((10, 0), (10 + FILLET4_R, 0))
        make_face()
    revolve(axis=Axis((33, -10, 10), (-1, 0, 0)), revolution_arc=90, mode=Mode.SUBTRACT)
    with BuildSketch(Plane(origin=(0, -10, 10), x_dir=(0, 1, 0), z_dir=(0, 0, 1))) as fillet4_piece_8:
        with BuildLine():
            CenterArc((10 + FILLET4_R, -FILLET4_R), FILLET4_R, 90, 90)
            Line((10 + FILLET4_R, 0), (10, 0))
            Line((10, 0), (10, -FILLET4_R))
        make_face()
    revolve(axis=Axis((0, -10, 10), (-1, 0, 0)), revolution_arc=90, mode=Mode.SUBTRACT)


solid = part.part
